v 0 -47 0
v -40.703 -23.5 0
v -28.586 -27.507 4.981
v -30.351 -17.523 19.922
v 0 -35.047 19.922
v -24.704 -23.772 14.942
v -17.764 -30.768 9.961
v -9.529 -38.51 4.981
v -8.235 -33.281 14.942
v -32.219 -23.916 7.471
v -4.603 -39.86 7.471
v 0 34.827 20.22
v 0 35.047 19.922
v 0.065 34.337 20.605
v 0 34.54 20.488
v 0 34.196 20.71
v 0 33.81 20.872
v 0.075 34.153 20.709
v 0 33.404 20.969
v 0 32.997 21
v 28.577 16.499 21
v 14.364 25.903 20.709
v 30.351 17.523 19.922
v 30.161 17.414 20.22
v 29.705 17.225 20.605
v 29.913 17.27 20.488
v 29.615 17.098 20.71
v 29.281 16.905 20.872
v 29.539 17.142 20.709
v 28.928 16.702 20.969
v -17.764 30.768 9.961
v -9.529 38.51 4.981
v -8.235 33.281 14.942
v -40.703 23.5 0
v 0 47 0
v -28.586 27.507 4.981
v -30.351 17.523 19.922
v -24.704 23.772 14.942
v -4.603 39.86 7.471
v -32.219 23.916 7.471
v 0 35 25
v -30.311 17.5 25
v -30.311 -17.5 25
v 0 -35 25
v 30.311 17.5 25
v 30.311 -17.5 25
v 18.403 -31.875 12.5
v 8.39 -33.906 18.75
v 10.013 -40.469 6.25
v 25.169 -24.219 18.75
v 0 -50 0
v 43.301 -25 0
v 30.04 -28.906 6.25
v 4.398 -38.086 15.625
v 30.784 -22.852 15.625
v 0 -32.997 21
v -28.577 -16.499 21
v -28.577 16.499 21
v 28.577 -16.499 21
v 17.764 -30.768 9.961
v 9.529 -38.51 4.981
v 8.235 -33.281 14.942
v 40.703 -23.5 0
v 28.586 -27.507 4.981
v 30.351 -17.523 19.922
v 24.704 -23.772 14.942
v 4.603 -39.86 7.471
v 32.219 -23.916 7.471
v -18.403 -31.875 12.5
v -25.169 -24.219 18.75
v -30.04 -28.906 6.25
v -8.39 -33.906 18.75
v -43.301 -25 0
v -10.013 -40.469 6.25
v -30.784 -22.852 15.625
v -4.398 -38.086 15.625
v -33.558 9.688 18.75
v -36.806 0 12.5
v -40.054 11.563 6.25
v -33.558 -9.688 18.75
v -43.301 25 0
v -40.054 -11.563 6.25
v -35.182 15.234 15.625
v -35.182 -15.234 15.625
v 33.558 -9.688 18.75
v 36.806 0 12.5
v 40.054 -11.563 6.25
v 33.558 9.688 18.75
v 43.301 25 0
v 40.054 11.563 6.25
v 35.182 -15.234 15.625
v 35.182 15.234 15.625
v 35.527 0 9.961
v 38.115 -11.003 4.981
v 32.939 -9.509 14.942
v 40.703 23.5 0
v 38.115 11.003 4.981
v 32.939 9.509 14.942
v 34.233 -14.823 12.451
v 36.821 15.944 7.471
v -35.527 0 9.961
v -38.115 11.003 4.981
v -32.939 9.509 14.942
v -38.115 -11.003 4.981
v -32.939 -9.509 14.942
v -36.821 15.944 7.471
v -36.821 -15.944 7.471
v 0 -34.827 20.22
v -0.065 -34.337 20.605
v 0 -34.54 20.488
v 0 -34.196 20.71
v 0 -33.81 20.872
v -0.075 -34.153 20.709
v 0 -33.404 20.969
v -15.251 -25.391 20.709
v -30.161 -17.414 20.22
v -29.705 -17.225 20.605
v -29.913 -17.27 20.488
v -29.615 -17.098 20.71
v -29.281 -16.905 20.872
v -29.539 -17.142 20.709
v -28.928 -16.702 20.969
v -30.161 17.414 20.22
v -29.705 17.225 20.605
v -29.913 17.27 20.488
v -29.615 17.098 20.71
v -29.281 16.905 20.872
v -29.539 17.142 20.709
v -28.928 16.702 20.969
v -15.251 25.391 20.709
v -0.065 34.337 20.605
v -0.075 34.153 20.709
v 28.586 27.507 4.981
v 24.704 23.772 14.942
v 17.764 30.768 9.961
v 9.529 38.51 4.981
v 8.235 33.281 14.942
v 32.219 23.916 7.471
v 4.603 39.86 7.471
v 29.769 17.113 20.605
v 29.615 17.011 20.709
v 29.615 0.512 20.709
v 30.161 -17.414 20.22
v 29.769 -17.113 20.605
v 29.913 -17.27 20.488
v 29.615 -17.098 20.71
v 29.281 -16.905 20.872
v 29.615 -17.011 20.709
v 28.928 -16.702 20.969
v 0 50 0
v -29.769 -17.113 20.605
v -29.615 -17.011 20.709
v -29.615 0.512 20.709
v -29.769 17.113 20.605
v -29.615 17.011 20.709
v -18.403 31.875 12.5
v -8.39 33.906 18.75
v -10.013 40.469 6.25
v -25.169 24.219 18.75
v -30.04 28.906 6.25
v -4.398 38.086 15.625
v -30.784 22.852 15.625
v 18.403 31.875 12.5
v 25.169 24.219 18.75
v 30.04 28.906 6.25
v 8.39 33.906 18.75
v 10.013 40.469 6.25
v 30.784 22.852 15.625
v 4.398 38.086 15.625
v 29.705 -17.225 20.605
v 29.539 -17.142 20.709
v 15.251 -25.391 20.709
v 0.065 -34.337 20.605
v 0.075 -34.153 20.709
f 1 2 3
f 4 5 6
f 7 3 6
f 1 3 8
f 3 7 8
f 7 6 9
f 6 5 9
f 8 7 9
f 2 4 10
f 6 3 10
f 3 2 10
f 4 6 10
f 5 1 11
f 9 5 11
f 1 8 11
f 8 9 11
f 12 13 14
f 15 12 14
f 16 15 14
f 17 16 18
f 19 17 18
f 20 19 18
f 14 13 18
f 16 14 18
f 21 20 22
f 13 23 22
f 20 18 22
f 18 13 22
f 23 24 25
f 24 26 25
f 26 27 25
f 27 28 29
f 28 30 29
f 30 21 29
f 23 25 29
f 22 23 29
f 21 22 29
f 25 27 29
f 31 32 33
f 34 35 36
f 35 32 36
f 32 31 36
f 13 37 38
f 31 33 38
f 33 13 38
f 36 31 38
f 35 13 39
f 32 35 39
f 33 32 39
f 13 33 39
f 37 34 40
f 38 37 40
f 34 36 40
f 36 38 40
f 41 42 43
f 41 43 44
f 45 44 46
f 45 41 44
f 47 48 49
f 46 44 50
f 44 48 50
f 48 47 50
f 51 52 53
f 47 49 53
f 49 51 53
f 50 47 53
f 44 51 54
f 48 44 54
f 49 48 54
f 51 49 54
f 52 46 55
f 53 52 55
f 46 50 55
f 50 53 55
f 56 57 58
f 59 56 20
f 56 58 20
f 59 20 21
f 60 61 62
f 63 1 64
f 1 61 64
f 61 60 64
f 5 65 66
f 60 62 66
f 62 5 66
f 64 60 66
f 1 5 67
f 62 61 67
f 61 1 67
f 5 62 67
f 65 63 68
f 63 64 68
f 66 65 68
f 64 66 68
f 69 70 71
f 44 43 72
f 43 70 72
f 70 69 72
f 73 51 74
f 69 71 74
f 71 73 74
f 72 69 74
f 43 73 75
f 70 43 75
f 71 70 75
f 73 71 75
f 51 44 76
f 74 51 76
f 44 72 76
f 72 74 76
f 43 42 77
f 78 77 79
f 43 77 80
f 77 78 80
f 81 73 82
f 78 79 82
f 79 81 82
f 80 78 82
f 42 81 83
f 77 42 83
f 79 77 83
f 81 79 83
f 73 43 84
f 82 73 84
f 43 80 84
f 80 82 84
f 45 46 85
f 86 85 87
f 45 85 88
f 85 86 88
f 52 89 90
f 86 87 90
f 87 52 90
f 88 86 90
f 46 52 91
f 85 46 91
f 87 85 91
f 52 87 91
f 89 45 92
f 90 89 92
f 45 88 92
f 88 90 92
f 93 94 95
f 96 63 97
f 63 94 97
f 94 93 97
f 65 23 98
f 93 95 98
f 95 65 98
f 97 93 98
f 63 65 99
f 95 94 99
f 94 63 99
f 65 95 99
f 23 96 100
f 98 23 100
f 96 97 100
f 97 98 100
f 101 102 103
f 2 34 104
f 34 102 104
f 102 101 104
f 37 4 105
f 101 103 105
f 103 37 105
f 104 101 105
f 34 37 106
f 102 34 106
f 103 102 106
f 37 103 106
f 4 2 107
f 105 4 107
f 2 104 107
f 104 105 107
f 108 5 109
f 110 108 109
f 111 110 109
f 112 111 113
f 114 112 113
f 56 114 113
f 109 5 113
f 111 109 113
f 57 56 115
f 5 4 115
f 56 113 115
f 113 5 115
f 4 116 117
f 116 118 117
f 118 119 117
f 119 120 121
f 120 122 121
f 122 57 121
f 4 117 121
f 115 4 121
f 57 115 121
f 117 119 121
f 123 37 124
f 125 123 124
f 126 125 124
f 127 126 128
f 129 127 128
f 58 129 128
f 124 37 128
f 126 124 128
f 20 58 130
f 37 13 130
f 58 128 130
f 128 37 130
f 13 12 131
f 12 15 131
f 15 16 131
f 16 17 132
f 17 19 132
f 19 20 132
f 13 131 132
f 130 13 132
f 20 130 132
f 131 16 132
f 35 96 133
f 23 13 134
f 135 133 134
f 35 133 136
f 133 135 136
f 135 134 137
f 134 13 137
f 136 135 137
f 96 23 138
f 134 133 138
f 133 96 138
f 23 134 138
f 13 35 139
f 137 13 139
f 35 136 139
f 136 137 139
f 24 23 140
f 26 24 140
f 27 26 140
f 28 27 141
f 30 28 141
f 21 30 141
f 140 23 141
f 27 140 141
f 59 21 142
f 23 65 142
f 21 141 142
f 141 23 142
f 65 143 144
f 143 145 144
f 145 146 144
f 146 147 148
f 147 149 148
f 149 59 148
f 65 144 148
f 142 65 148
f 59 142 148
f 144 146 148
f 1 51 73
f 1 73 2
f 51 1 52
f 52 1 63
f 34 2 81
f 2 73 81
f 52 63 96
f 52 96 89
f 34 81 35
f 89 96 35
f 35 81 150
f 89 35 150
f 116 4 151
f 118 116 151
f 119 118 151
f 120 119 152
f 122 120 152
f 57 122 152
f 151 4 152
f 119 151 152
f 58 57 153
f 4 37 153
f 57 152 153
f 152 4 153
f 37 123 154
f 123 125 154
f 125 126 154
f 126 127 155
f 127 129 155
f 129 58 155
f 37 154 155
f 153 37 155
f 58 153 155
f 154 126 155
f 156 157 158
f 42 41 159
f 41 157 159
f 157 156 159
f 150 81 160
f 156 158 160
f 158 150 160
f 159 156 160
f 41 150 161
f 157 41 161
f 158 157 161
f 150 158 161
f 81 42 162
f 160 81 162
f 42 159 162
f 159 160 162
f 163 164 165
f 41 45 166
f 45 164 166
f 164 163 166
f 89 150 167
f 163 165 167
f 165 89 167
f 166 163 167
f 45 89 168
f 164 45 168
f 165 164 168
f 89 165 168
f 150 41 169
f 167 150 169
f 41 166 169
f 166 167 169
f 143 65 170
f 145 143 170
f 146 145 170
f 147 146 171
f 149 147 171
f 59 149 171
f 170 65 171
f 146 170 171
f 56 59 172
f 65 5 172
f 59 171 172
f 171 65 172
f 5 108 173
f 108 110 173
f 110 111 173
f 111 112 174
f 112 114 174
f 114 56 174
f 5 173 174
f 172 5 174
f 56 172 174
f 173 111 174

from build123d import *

# Parameters (mm, degrees)
F1_DEPTH = 25
F8_DEPTH = 4
F9_R     = 2


with BuildPart() as f1:
    # F0 (on Top) → F1 (new body)
    with BuildSketch(Plane.XY):
        Polygon((0, -35), (30.3108891325, -17.5), (30.3108891325, 17.5), (0, 35), (-30.3108891325, 17.5), (-30.3108891325, -17.5), align=None)
    extrude(amount=F1_DEPTH)

    # F1_face (on face) → F3 section 0
    with BuildSketch(Plane.XY.offset(25)):
        Polygon((-30.3108891325, -17.5), (0, -35), (30.3108891325, -17.5), (30.3108891325, 17.5), (0, 35), (-30.3108891325, 17.5), align=None)
    # F2 (on Top) → F3 section 1
    with BuildSketch(Plane.XY):
        Polygon((43.3012701892, 25), (0, 50), (-43.3012701892, 25), (-43.3012701892, -25), (0, -50), (43.3012701892, -25), align=None)
    loft()

    # F4 (on Top) → F6 section 0
    with BuildSketch(Plane.XY):
        Polygon((-40.7031939779, -23.5), (0, -47), (40.7031939779, -23.5), (40.7031939779, 23.5), (0, 47), (-40.7031939779, 23.5), align=None)
    # F5 (on face) → F6 section 1
    with BuildSketch(Plane.XY.offset(25)):
        Polygon((27.7128129211, 16), (0, 32), (-27.7128129211, 16), (-27.7128129211, -16), (0, -32), (27.7128129211, -16), align=None)
    loft(mode=Mode.SUBTRACT)

    # F7 (on face) → F8 (join)
    with BuildSketch(Plane.XY.offset(25)):
        Polygon((-30.3108891325, -17.5), (0, -35), (30.3108891325, -17.5), (30.3108891325, 17.5), (0, 35), (-30.3108891325, 17.5), align=None)
    extrude(amount=-F8_DEPTH)

    # F9
    f9_edges = [f1.edges().sort_by_distance(p)[0] for p in [
        (-14.895637, -25.8, 21),
        (-29.791274, 0, 21),
        (14.895637, -25.8, 21),
        (29.791274, 0, 21),
        (14.895637, 25.8, 21),
        (-14.895637, 25.8, 21),
    ]]
    fillet(f9_edges, radius=F9_R)


solid = f1.part
